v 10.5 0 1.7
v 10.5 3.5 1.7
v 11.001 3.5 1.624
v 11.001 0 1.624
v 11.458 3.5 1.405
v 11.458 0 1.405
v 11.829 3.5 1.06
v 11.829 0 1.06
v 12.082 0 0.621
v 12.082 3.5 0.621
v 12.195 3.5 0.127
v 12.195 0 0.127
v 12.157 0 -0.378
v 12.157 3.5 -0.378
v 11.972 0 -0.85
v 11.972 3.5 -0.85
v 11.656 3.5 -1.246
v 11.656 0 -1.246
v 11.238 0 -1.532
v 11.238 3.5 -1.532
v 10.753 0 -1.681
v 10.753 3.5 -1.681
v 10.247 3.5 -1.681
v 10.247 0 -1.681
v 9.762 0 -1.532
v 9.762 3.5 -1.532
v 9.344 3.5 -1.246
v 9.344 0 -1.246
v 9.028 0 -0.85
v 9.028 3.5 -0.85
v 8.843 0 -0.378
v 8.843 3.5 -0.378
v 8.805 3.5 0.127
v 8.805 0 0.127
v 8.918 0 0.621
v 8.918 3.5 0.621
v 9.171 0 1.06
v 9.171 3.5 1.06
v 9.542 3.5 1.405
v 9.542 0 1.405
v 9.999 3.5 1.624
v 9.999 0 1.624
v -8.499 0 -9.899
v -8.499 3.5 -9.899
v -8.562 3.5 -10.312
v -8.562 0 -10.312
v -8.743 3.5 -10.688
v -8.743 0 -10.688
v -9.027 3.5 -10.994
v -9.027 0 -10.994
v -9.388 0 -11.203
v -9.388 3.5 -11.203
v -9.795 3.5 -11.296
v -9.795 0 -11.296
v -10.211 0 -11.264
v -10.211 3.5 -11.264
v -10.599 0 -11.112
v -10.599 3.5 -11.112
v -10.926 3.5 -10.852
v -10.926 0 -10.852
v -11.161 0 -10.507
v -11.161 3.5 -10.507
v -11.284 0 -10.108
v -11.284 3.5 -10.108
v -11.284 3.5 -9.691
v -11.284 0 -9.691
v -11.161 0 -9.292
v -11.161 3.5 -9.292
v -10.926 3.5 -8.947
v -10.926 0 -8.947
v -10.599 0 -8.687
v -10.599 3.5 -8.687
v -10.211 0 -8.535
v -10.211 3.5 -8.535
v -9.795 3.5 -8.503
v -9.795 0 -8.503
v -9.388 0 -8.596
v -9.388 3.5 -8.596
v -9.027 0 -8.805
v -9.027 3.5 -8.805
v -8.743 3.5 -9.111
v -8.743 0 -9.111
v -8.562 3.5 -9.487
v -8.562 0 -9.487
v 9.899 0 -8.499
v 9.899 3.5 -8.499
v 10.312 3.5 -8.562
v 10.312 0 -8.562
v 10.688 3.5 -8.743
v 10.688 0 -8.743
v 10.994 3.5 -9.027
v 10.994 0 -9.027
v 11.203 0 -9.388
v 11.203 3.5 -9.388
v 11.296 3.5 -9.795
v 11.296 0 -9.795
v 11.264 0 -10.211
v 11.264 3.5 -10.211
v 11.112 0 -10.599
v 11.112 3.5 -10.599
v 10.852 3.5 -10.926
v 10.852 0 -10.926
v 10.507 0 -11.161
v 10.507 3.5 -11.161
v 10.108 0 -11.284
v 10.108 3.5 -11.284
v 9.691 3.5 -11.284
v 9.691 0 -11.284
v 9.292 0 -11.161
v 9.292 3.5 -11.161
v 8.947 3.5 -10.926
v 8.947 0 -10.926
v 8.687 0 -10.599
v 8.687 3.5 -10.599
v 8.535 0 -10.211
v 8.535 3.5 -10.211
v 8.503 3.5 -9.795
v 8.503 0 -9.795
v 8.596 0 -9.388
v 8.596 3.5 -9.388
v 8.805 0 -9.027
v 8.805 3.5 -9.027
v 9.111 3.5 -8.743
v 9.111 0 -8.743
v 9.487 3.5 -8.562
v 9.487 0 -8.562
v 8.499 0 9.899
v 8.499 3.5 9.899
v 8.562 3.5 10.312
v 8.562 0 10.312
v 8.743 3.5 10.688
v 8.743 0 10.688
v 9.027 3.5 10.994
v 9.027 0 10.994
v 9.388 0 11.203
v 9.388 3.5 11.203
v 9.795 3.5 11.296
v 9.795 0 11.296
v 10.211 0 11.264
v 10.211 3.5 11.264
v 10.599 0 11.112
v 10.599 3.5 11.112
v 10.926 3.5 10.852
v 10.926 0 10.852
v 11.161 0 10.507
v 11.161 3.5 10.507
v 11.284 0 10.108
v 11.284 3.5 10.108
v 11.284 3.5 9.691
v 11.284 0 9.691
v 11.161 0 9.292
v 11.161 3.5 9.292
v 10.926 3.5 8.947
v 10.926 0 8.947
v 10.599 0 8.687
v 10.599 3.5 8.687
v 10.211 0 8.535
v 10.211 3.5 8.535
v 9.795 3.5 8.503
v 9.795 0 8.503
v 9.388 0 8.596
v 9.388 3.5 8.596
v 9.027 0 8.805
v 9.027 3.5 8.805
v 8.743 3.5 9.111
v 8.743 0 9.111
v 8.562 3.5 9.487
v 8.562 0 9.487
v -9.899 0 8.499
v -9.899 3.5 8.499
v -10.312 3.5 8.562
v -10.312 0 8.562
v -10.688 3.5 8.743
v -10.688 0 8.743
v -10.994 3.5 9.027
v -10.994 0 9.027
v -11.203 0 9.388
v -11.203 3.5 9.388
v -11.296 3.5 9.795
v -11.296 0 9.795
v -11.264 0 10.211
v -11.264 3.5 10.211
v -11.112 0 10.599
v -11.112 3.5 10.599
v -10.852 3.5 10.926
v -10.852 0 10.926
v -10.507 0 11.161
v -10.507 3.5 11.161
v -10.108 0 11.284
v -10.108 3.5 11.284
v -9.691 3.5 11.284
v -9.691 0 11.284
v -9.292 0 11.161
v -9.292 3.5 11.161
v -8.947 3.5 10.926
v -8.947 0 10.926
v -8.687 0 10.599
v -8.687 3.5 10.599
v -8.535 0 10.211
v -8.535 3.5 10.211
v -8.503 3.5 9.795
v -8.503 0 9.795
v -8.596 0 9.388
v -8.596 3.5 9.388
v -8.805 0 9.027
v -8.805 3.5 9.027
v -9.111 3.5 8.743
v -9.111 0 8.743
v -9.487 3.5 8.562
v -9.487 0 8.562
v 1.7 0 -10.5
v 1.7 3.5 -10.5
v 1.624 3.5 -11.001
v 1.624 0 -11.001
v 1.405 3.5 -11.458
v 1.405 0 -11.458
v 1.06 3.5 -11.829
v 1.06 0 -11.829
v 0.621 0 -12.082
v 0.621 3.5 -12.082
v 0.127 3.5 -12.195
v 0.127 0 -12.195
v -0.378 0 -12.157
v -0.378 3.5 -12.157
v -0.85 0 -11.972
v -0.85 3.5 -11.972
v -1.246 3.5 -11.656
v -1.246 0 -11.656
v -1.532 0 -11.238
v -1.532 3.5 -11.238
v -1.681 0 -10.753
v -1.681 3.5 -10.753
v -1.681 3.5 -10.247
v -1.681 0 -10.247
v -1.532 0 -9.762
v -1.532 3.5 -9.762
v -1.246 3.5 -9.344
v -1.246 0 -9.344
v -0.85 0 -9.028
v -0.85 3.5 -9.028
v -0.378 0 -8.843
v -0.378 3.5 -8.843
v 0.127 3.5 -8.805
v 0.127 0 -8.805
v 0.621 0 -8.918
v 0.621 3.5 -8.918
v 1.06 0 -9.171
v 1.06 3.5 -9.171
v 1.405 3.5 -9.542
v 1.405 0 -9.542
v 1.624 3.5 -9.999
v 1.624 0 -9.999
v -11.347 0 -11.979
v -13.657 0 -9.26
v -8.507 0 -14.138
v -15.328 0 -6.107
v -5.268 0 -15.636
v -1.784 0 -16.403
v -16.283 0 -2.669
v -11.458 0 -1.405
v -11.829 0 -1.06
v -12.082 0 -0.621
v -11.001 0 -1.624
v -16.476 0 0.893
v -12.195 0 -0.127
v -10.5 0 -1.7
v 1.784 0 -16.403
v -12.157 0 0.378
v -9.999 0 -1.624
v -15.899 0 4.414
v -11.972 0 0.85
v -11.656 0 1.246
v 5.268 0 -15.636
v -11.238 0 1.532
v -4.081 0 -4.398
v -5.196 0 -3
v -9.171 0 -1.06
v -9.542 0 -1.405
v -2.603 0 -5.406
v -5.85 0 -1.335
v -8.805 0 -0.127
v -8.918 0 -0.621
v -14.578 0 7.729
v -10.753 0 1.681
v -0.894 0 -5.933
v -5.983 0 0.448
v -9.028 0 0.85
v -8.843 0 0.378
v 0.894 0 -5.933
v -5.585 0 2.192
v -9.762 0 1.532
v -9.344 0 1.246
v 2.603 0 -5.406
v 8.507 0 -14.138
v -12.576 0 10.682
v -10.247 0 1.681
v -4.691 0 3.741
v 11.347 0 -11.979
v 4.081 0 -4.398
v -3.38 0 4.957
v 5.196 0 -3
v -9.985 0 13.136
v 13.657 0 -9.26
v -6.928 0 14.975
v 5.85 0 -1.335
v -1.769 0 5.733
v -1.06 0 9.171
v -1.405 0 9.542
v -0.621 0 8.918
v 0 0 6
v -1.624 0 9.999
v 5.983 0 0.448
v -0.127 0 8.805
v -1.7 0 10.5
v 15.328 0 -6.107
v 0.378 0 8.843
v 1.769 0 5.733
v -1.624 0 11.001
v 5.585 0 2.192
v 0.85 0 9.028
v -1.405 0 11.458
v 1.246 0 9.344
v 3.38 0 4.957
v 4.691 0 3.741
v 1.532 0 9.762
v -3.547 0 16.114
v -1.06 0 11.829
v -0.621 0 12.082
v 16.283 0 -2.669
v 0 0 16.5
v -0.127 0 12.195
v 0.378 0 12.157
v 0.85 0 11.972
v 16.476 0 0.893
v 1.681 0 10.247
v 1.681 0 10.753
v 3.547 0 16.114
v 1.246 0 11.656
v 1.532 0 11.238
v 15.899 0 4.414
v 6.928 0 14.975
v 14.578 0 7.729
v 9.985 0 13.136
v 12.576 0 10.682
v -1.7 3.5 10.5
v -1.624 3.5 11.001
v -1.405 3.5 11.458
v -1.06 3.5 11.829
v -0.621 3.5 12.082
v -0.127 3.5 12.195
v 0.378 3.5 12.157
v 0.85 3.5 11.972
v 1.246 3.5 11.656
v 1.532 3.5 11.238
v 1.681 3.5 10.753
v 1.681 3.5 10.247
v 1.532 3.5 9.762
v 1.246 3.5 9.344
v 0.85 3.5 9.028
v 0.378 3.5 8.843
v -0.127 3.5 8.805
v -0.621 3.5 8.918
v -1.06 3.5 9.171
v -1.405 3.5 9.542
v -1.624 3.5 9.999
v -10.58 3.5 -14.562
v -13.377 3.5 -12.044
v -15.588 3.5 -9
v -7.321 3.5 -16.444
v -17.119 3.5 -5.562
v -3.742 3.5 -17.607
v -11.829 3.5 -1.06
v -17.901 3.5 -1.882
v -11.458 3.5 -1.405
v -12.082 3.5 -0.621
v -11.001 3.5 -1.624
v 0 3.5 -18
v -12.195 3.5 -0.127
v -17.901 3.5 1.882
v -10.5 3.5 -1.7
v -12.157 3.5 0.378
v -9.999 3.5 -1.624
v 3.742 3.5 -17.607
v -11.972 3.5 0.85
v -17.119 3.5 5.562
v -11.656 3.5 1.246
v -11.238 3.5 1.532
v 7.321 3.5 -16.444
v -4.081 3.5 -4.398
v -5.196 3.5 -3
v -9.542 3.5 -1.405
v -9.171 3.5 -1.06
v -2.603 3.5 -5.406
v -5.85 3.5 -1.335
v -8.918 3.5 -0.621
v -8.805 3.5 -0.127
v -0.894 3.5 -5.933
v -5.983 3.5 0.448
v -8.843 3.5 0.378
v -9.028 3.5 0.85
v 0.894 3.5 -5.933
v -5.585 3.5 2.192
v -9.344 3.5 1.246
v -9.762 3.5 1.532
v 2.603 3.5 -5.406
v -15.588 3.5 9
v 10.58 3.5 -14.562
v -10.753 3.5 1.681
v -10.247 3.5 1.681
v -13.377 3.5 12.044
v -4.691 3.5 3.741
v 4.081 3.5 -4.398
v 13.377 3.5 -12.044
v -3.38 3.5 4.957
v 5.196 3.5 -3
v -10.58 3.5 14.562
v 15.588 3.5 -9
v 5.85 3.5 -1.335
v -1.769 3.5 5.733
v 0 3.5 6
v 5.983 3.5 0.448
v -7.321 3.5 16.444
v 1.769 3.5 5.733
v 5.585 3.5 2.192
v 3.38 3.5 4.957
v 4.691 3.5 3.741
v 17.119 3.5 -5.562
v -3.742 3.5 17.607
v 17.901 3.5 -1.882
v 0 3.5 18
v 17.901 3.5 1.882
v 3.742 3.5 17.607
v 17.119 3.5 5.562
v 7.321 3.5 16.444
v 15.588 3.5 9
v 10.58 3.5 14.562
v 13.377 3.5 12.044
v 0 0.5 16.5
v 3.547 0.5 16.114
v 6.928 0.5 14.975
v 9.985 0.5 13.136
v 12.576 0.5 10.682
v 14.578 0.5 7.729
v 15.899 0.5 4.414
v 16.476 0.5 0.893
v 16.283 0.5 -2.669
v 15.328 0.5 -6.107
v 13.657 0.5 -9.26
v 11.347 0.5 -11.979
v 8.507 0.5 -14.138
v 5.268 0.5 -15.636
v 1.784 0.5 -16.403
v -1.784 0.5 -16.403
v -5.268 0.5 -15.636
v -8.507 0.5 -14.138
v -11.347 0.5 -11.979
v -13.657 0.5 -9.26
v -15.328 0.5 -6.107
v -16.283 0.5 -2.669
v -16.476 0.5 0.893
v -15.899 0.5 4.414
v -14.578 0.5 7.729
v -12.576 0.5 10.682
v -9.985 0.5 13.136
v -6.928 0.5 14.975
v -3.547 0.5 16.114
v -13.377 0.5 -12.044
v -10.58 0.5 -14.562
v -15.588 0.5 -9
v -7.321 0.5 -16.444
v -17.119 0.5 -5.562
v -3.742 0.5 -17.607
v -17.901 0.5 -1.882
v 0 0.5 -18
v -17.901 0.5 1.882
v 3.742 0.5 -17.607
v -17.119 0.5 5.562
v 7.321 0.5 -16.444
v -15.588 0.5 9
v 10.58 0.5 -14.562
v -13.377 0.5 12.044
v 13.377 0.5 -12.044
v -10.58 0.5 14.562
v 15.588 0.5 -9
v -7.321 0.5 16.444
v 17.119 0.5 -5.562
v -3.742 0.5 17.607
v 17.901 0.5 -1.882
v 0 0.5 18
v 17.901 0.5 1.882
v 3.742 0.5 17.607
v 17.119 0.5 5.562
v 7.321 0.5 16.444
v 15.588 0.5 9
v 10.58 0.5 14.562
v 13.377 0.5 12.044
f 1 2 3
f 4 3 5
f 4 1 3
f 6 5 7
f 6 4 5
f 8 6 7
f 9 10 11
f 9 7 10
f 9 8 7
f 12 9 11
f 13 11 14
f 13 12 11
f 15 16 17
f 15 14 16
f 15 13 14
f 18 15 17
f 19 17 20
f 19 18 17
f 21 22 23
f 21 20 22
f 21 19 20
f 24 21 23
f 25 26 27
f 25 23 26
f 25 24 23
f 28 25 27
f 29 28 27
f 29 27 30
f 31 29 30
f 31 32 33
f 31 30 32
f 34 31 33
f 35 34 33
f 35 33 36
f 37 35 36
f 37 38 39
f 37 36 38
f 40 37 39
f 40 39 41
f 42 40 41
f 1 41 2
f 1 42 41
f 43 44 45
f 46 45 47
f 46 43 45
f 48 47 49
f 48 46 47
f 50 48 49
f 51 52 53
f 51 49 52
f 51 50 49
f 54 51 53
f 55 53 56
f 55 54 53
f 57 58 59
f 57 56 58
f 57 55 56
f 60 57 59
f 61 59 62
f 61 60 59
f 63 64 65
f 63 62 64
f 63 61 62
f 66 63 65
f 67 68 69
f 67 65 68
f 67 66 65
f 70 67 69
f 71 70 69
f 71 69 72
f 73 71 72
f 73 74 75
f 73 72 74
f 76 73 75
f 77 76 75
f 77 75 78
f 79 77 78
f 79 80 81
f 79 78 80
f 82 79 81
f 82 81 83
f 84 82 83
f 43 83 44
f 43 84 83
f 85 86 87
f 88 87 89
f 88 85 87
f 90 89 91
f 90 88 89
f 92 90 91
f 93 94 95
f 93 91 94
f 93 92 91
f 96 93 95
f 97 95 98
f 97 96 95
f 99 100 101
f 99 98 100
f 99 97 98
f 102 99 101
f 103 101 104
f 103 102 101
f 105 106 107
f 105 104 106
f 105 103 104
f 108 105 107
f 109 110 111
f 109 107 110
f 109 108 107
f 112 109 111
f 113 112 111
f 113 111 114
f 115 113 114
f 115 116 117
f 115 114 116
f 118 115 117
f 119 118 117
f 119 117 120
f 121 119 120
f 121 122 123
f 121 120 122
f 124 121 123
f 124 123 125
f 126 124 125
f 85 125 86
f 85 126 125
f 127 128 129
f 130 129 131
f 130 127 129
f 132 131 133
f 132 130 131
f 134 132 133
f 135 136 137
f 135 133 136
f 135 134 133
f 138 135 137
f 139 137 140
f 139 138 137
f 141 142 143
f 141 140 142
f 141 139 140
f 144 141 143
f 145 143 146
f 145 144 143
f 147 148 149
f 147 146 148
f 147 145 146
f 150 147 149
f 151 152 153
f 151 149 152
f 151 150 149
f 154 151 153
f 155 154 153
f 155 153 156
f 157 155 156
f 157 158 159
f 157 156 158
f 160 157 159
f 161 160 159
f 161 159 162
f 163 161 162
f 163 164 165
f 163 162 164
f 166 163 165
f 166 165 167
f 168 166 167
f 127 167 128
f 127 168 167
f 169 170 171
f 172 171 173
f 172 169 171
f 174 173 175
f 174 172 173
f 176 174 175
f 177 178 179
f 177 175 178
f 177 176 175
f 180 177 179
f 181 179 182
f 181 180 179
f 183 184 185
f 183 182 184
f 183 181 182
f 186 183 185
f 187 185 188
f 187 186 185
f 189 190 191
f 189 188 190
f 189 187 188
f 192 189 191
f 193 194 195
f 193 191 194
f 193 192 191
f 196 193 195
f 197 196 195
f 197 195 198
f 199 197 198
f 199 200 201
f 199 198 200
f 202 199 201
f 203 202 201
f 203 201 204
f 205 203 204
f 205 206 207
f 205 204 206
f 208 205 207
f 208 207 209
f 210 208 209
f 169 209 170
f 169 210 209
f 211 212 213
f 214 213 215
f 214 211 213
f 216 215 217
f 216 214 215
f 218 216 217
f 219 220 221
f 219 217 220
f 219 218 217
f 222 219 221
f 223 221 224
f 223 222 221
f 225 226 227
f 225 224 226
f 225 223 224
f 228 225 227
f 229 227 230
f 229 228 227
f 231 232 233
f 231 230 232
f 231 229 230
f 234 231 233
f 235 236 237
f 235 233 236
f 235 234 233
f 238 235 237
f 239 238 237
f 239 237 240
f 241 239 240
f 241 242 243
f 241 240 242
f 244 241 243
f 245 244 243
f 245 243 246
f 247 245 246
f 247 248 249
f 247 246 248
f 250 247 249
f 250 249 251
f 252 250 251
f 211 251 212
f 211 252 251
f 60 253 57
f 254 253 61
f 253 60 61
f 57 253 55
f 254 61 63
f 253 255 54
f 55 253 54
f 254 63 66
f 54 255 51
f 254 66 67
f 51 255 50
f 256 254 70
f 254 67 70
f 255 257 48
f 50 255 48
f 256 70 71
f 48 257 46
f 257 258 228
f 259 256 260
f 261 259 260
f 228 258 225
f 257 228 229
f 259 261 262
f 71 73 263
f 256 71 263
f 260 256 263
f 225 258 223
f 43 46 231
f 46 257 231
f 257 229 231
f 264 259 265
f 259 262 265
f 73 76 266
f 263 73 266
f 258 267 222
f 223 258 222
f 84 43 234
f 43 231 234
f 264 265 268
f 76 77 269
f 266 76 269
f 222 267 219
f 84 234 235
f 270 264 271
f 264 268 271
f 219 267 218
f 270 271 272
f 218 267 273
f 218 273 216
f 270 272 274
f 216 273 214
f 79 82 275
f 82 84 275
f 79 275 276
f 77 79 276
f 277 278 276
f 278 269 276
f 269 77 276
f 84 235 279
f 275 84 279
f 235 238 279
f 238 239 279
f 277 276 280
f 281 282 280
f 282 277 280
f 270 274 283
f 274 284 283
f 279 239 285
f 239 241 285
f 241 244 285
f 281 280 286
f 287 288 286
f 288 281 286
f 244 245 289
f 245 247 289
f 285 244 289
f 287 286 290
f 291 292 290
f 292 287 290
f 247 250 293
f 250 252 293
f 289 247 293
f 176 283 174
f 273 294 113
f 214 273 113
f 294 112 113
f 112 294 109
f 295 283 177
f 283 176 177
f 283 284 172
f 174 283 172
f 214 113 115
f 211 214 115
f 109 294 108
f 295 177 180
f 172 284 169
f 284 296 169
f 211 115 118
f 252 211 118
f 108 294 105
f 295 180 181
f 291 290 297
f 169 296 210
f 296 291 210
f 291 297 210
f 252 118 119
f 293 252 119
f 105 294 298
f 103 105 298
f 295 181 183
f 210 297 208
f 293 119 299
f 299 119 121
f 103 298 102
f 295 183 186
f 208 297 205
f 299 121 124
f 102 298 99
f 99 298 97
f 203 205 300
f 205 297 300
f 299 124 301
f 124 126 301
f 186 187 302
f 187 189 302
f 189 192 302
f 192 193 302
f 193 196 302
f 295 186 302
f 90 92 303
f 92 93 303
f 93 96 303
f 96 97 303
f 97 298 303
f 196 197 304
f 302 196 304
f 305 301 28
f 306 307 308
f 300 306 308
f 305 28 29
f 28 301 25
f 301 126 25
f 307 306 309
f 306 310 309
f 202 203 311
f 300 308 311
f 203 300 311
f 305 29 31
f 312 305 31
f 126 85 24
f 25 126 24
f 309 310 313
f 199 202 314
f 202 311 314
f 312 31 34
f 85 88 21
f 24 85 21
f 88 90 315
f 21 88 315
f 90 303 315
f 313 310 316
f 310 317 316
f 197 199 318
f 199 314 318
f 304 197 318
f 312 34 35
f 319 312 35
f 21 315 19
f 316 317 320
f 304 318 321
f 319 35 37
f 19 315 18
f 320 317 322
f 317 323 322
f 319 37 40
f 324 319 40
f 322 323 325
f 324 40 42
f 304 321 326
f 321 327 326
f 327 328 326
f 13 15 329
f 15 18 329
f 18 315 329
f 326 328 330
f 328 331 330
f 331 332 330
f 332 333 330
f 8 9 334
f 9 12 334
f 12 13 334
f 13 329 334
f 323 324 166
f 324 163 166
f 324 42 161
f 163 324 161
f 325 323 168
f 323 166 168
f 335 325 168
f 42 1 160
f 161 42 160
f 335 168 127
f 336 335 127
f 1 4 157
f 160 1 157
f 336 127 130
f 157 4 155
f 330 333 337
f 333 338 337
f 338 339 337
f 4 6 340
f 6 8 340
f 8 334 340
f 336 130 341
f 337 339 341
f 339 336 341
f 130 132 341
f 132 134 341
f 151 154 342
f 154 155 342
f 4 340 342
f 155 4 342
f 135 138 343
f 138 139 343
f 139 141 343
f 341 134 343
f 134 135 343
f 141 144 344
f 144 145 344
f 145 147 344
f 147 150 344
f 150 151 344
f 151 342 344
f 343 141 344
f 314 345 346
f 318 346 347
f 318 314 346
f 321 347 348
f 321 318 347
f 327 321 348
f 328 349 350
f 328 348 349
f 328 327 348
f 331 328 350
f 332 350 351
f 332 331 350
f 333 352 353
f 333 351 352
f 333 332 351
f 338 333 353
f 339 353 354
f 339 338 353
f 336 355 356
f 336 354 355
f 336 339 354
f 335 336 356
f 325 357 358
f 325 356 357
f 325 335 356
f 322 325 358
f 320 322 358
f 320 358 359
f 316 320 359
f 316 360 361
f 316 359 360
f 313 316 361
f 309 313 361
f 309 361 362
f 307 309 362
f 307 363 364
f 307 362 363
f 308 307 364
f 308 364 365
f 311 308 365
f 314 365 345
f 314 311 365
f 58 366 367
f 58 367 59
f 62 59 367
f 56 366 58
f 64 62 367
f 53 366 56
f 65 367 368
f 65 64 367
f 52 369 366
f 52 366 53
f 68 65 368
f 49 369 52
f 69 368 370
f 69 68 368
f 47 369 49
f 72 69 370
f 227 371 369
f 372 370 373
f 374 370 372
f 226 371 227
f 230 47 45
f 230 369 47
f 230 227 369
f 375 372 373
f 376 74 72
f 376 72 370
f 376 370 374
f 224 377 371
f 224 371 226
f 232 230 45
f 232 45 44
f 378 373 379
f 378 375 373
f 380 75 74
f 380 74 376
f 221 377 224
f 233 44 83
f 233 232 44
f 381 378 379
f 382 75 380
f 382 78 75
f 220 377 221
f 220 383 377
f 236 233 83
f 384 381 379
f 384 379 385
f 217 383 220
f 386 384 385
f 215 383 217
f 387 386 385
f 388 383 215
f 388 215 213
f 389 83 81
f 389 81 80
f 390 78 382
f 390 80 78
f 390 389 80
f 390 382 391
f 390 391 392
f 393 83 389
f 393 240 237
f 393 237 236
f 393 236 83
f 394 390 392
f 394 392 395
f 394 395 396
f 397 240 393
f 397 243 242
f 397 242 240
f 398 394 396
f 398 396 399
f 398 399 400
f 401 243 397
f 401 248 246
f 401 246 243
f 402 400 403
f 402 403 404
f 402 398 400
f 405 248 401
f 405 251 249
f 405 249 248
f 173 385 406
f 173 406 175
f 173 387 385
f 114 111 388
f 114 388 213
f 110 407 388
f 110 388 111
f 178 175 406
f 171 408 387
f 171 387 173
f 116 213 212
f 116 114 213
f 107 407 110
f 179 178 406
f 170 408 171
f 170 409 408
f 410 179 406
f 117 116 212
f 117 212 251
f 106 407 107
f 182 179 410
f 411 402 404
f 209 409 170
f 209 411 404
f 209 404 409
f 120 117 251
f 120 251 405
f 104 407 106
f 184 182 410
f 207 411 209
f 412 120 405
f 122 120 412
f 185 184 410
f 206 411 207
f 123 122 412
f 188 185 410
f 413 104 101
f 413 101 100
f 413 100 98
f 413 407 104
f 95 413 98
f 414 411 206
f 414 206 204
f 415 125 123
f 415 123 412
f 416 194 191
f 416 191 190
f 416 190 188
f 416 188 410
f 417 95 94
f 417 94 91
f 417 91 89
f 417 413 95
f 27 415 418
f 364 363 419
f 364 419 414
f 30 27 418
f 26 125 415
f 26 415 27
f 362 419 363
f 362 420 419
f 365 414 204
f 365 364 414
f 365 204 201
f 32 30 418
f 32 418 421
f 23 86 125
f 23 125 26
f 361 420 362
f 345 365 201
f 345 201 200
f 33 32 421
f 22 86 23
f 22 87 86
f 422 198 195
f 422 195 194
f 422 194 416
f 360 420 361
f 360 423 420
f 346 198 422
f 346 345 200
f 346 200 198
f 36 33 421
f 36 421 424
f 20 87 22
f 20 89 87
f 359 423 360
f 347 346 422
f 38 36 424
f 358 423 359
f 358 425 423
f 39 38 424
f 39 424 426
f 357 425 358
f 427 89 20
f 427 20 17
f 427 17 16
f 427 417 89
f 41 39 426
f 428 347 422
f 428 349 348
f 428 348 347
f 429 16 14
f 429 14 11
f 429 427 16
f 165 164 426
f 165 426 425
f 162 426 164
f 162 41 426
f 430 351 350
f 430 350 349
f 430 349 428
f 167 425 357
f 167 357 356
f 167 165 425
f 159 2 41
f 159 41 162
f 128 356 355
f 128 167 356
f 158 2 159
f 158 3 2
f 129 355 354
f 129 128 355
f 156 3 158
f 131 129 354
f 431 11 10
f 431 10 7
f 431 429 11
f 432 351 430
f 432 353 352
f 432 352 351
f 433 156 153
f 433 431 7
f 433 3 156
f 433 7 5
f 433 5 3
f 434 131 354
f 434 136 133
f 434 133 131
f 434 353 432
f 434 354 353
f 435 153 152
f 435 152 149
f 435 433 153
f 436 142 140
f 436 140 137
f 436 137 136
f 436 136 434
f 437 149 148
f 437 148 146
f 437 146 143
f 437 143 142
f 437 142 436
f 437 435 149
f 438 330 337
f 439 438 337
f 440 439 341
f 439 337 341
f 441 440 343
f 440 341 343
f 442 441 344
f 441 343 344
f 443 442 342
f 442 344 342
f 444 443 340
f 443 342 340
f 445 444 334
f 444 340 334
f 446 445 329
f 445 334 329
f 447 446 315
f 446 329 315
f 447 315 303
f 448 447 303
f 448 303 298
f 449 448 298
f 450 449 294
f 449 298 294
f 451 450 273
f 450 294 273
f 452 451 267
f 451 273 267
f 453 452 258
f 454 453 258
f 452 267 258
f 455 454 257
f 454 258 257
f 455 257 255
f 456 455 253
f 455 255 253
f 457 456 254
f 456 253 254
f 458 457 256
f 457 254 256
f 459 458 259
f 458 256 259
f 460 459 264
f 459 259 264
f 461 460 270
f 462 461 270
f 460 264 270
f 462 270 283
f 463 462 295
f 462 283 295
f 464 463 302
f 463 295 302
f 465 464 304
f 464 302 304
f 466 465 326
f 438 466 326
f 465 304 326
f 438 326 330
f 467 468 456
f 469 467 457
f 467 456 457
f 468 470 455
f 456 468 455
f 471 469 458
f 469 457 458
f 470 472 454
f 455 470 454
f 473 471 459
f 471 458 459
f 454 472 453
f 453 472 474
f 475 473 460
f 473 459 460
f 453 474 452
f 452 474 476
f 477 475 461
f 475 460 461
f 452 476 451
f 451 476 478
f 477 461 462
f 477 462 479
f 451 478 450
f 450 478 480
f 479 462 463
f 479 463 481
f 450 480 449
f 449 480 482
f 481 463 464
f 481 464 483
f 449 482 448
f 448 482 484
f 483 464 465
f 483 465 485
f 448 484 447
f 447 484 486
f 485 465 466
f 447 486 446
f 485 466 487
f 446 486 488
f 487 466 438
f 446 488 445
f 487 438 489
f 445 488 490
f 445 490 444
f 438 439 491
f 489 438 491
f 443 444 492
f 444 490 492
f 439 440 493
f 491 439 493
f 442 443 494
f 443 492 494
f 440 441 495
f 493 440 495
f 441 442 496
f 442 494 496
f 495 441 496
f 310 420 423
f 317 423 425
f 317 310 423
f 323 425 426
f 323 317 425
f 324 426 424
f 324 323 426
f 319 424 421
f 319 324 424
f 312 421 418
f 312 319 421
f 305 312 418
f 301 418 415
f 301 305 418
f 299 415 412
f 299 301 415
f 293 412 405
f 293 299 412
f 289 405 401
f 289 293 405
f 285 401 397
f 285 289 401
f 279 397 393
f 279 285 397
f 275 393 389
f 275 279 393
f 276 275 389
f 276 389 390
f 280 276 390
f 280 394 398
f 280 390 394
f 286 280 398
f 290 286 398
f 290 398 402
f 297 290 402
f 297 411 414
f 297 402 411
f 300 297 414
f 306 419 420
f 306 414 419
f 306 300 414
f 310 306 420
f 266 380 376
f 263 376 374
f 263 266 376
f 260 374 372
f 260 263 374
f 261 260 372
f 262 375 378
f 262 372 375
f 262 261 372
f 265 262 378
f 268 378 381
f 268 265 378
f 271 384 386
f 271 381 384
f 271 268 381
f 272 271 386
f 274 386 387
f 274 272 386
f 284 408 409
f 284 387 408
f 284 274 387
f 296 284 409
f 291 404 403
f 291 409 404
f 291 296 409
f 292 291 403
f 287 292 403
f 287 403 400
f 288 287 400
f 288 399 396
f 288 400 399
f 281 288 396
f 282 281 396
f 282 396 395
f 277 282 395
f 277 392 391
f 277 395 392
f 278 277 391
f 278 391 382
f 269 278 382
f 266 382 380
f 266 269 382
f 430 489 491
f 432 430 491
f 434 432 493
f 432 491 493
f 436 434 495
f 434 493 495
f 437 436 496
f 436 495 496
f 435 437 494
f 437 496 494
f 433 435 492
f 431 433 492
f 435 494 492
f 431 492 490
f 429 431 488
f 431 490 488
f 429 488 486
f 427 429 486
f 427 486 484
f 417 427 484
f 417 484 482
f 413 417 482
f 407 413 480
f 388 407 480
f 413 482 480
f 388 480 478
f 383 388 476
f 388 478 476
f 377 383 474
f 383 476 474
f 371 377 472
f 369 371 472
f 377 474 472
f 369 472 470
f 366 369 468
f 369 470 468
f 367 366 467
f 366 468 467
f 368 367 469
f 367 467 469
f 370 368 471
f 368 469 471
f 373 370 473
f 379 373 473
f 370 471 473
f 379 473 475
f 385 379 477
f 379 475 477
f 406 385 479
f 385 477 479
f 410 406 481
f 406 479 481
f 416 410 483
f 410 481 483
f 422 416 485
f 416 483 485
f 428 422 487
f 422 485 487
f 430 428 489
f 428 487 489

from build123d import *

# Parameters (mm, degrees)
SKETCH1_R           = 16.5
BOSS_EXTRUDE1_DEPTH = 0.5
SKETCH2_R           = 18
BOSS_EXTRUDE2_DEPTH = 3
SKETCH3_R           = 6
CUT_EXTRUDE1_DEPTH  = 26.695330315
SKETCH4_R           = 1.7
CUT_EXTRUDE2_DEPTH  = 26.695330315
CIRPATTERN1_COUNT   = 4
SKETCH5_R           = 1.4
CUT_EXTRUDE3_DEPTH  = 26.695330315
CIRPATTERN2_COUNT   = 4


with BuildPart() as part:
    # Sketch1 → Boss-Extrude1 (new body)
    with BuildSketch(Plane(origin=(0, 0, 0), x_dir=(1, 0, 0), z_dir=(0, 1, 0))):
        with Locations(Location((0, 0, 0), (0, 0, 270))):
            Circle(SKETCH1_R)
    extrude(amount=BOSS_EXTRUDE1_DEPTH)

    # Sketch2 → Boss-Extrude2 (add)
    with BuildSketch(Plane(origin=(0, 0.5, 0), x_dir=(1, 0, 0), z_dir=(0, 1, 0))):
        with Locations(Location((0, 0, 0), (0, 0, 270))):
            Circle(SKETCH2_R)
    extrude(amount=BOSS_EXTRUDE2_DEPTH)

    # Sketch3 → Cut-Extrude1 (cut, through all)
    with BuildSketch(Plane(origin=(0, 0, 0), x_dir=(1, 0, 0), z_dir=(0, 1, 0))):
        with Locations(Location((0, 0, 0), (0, 0, 270))):
            Circle(SKETCH3_R)
    extrude(amount=CUT_EXTRUDE1_DEPTH, mode=Mode.SUBTRACT)

    # Sketch4 → Cut-Extrude2 (cut, through all)
    with BuildSketch(Plane(origin=(0, 0, 0), x_dir=(1, 0, 0), z_dir=(0, 1, 0))):
        with Locations(Location((10.5, 0, 0), (0, 0, 270))):
            Circle(SKETCH4_R)
    cut_extrude2 = extrude(amount=CUT_EXTRUDE2_DEPTH, mode=Mode.SUBTRACT)

    # CirPattern1: Cut-Extrude2 ×4 about axis
    cirpattern1_axis = Axis((0, 0, 0), (0, 1, 0))
    for i in range(1, CIRPATTERN1_COUNT):
        add(cut_extrude2.rotate(cirpattern1_axis, i * 360 / CIRPATTERN1_COUNT), mode=Mode.SUBTRACT)

    # Sketch5 → Cut-Extrude3 (cut, through all)
    with BuildSketch(Plane(origin=(0, 0, 0), x_dir=(1, 0, 0), z_dir=(0, 1, 0))):
        with Locations(Location((9.899494937, 9.899494937, 0), (0, 0, 270))):
            Circle(SKETCH5_R)
    cut_extrude3 = extrude(amount=CUT_EXTRUDE3_DEPTH, mode=Mode.SUBTRACT)

    # CirPattern2: Cut-Extrude3 ×4 about axis
    cirpattern2_axis = Axis((0, 0, 0), (0, 1, 0))
    for i in range(1, CIRPATTERN2_COUNT):
        add(cut_extrude3.rotate(cirpattern2_axis, i * 360 / CIRPATTERN2_COUNT), mode=Mode.SUBTRACT)


solid = part.part
